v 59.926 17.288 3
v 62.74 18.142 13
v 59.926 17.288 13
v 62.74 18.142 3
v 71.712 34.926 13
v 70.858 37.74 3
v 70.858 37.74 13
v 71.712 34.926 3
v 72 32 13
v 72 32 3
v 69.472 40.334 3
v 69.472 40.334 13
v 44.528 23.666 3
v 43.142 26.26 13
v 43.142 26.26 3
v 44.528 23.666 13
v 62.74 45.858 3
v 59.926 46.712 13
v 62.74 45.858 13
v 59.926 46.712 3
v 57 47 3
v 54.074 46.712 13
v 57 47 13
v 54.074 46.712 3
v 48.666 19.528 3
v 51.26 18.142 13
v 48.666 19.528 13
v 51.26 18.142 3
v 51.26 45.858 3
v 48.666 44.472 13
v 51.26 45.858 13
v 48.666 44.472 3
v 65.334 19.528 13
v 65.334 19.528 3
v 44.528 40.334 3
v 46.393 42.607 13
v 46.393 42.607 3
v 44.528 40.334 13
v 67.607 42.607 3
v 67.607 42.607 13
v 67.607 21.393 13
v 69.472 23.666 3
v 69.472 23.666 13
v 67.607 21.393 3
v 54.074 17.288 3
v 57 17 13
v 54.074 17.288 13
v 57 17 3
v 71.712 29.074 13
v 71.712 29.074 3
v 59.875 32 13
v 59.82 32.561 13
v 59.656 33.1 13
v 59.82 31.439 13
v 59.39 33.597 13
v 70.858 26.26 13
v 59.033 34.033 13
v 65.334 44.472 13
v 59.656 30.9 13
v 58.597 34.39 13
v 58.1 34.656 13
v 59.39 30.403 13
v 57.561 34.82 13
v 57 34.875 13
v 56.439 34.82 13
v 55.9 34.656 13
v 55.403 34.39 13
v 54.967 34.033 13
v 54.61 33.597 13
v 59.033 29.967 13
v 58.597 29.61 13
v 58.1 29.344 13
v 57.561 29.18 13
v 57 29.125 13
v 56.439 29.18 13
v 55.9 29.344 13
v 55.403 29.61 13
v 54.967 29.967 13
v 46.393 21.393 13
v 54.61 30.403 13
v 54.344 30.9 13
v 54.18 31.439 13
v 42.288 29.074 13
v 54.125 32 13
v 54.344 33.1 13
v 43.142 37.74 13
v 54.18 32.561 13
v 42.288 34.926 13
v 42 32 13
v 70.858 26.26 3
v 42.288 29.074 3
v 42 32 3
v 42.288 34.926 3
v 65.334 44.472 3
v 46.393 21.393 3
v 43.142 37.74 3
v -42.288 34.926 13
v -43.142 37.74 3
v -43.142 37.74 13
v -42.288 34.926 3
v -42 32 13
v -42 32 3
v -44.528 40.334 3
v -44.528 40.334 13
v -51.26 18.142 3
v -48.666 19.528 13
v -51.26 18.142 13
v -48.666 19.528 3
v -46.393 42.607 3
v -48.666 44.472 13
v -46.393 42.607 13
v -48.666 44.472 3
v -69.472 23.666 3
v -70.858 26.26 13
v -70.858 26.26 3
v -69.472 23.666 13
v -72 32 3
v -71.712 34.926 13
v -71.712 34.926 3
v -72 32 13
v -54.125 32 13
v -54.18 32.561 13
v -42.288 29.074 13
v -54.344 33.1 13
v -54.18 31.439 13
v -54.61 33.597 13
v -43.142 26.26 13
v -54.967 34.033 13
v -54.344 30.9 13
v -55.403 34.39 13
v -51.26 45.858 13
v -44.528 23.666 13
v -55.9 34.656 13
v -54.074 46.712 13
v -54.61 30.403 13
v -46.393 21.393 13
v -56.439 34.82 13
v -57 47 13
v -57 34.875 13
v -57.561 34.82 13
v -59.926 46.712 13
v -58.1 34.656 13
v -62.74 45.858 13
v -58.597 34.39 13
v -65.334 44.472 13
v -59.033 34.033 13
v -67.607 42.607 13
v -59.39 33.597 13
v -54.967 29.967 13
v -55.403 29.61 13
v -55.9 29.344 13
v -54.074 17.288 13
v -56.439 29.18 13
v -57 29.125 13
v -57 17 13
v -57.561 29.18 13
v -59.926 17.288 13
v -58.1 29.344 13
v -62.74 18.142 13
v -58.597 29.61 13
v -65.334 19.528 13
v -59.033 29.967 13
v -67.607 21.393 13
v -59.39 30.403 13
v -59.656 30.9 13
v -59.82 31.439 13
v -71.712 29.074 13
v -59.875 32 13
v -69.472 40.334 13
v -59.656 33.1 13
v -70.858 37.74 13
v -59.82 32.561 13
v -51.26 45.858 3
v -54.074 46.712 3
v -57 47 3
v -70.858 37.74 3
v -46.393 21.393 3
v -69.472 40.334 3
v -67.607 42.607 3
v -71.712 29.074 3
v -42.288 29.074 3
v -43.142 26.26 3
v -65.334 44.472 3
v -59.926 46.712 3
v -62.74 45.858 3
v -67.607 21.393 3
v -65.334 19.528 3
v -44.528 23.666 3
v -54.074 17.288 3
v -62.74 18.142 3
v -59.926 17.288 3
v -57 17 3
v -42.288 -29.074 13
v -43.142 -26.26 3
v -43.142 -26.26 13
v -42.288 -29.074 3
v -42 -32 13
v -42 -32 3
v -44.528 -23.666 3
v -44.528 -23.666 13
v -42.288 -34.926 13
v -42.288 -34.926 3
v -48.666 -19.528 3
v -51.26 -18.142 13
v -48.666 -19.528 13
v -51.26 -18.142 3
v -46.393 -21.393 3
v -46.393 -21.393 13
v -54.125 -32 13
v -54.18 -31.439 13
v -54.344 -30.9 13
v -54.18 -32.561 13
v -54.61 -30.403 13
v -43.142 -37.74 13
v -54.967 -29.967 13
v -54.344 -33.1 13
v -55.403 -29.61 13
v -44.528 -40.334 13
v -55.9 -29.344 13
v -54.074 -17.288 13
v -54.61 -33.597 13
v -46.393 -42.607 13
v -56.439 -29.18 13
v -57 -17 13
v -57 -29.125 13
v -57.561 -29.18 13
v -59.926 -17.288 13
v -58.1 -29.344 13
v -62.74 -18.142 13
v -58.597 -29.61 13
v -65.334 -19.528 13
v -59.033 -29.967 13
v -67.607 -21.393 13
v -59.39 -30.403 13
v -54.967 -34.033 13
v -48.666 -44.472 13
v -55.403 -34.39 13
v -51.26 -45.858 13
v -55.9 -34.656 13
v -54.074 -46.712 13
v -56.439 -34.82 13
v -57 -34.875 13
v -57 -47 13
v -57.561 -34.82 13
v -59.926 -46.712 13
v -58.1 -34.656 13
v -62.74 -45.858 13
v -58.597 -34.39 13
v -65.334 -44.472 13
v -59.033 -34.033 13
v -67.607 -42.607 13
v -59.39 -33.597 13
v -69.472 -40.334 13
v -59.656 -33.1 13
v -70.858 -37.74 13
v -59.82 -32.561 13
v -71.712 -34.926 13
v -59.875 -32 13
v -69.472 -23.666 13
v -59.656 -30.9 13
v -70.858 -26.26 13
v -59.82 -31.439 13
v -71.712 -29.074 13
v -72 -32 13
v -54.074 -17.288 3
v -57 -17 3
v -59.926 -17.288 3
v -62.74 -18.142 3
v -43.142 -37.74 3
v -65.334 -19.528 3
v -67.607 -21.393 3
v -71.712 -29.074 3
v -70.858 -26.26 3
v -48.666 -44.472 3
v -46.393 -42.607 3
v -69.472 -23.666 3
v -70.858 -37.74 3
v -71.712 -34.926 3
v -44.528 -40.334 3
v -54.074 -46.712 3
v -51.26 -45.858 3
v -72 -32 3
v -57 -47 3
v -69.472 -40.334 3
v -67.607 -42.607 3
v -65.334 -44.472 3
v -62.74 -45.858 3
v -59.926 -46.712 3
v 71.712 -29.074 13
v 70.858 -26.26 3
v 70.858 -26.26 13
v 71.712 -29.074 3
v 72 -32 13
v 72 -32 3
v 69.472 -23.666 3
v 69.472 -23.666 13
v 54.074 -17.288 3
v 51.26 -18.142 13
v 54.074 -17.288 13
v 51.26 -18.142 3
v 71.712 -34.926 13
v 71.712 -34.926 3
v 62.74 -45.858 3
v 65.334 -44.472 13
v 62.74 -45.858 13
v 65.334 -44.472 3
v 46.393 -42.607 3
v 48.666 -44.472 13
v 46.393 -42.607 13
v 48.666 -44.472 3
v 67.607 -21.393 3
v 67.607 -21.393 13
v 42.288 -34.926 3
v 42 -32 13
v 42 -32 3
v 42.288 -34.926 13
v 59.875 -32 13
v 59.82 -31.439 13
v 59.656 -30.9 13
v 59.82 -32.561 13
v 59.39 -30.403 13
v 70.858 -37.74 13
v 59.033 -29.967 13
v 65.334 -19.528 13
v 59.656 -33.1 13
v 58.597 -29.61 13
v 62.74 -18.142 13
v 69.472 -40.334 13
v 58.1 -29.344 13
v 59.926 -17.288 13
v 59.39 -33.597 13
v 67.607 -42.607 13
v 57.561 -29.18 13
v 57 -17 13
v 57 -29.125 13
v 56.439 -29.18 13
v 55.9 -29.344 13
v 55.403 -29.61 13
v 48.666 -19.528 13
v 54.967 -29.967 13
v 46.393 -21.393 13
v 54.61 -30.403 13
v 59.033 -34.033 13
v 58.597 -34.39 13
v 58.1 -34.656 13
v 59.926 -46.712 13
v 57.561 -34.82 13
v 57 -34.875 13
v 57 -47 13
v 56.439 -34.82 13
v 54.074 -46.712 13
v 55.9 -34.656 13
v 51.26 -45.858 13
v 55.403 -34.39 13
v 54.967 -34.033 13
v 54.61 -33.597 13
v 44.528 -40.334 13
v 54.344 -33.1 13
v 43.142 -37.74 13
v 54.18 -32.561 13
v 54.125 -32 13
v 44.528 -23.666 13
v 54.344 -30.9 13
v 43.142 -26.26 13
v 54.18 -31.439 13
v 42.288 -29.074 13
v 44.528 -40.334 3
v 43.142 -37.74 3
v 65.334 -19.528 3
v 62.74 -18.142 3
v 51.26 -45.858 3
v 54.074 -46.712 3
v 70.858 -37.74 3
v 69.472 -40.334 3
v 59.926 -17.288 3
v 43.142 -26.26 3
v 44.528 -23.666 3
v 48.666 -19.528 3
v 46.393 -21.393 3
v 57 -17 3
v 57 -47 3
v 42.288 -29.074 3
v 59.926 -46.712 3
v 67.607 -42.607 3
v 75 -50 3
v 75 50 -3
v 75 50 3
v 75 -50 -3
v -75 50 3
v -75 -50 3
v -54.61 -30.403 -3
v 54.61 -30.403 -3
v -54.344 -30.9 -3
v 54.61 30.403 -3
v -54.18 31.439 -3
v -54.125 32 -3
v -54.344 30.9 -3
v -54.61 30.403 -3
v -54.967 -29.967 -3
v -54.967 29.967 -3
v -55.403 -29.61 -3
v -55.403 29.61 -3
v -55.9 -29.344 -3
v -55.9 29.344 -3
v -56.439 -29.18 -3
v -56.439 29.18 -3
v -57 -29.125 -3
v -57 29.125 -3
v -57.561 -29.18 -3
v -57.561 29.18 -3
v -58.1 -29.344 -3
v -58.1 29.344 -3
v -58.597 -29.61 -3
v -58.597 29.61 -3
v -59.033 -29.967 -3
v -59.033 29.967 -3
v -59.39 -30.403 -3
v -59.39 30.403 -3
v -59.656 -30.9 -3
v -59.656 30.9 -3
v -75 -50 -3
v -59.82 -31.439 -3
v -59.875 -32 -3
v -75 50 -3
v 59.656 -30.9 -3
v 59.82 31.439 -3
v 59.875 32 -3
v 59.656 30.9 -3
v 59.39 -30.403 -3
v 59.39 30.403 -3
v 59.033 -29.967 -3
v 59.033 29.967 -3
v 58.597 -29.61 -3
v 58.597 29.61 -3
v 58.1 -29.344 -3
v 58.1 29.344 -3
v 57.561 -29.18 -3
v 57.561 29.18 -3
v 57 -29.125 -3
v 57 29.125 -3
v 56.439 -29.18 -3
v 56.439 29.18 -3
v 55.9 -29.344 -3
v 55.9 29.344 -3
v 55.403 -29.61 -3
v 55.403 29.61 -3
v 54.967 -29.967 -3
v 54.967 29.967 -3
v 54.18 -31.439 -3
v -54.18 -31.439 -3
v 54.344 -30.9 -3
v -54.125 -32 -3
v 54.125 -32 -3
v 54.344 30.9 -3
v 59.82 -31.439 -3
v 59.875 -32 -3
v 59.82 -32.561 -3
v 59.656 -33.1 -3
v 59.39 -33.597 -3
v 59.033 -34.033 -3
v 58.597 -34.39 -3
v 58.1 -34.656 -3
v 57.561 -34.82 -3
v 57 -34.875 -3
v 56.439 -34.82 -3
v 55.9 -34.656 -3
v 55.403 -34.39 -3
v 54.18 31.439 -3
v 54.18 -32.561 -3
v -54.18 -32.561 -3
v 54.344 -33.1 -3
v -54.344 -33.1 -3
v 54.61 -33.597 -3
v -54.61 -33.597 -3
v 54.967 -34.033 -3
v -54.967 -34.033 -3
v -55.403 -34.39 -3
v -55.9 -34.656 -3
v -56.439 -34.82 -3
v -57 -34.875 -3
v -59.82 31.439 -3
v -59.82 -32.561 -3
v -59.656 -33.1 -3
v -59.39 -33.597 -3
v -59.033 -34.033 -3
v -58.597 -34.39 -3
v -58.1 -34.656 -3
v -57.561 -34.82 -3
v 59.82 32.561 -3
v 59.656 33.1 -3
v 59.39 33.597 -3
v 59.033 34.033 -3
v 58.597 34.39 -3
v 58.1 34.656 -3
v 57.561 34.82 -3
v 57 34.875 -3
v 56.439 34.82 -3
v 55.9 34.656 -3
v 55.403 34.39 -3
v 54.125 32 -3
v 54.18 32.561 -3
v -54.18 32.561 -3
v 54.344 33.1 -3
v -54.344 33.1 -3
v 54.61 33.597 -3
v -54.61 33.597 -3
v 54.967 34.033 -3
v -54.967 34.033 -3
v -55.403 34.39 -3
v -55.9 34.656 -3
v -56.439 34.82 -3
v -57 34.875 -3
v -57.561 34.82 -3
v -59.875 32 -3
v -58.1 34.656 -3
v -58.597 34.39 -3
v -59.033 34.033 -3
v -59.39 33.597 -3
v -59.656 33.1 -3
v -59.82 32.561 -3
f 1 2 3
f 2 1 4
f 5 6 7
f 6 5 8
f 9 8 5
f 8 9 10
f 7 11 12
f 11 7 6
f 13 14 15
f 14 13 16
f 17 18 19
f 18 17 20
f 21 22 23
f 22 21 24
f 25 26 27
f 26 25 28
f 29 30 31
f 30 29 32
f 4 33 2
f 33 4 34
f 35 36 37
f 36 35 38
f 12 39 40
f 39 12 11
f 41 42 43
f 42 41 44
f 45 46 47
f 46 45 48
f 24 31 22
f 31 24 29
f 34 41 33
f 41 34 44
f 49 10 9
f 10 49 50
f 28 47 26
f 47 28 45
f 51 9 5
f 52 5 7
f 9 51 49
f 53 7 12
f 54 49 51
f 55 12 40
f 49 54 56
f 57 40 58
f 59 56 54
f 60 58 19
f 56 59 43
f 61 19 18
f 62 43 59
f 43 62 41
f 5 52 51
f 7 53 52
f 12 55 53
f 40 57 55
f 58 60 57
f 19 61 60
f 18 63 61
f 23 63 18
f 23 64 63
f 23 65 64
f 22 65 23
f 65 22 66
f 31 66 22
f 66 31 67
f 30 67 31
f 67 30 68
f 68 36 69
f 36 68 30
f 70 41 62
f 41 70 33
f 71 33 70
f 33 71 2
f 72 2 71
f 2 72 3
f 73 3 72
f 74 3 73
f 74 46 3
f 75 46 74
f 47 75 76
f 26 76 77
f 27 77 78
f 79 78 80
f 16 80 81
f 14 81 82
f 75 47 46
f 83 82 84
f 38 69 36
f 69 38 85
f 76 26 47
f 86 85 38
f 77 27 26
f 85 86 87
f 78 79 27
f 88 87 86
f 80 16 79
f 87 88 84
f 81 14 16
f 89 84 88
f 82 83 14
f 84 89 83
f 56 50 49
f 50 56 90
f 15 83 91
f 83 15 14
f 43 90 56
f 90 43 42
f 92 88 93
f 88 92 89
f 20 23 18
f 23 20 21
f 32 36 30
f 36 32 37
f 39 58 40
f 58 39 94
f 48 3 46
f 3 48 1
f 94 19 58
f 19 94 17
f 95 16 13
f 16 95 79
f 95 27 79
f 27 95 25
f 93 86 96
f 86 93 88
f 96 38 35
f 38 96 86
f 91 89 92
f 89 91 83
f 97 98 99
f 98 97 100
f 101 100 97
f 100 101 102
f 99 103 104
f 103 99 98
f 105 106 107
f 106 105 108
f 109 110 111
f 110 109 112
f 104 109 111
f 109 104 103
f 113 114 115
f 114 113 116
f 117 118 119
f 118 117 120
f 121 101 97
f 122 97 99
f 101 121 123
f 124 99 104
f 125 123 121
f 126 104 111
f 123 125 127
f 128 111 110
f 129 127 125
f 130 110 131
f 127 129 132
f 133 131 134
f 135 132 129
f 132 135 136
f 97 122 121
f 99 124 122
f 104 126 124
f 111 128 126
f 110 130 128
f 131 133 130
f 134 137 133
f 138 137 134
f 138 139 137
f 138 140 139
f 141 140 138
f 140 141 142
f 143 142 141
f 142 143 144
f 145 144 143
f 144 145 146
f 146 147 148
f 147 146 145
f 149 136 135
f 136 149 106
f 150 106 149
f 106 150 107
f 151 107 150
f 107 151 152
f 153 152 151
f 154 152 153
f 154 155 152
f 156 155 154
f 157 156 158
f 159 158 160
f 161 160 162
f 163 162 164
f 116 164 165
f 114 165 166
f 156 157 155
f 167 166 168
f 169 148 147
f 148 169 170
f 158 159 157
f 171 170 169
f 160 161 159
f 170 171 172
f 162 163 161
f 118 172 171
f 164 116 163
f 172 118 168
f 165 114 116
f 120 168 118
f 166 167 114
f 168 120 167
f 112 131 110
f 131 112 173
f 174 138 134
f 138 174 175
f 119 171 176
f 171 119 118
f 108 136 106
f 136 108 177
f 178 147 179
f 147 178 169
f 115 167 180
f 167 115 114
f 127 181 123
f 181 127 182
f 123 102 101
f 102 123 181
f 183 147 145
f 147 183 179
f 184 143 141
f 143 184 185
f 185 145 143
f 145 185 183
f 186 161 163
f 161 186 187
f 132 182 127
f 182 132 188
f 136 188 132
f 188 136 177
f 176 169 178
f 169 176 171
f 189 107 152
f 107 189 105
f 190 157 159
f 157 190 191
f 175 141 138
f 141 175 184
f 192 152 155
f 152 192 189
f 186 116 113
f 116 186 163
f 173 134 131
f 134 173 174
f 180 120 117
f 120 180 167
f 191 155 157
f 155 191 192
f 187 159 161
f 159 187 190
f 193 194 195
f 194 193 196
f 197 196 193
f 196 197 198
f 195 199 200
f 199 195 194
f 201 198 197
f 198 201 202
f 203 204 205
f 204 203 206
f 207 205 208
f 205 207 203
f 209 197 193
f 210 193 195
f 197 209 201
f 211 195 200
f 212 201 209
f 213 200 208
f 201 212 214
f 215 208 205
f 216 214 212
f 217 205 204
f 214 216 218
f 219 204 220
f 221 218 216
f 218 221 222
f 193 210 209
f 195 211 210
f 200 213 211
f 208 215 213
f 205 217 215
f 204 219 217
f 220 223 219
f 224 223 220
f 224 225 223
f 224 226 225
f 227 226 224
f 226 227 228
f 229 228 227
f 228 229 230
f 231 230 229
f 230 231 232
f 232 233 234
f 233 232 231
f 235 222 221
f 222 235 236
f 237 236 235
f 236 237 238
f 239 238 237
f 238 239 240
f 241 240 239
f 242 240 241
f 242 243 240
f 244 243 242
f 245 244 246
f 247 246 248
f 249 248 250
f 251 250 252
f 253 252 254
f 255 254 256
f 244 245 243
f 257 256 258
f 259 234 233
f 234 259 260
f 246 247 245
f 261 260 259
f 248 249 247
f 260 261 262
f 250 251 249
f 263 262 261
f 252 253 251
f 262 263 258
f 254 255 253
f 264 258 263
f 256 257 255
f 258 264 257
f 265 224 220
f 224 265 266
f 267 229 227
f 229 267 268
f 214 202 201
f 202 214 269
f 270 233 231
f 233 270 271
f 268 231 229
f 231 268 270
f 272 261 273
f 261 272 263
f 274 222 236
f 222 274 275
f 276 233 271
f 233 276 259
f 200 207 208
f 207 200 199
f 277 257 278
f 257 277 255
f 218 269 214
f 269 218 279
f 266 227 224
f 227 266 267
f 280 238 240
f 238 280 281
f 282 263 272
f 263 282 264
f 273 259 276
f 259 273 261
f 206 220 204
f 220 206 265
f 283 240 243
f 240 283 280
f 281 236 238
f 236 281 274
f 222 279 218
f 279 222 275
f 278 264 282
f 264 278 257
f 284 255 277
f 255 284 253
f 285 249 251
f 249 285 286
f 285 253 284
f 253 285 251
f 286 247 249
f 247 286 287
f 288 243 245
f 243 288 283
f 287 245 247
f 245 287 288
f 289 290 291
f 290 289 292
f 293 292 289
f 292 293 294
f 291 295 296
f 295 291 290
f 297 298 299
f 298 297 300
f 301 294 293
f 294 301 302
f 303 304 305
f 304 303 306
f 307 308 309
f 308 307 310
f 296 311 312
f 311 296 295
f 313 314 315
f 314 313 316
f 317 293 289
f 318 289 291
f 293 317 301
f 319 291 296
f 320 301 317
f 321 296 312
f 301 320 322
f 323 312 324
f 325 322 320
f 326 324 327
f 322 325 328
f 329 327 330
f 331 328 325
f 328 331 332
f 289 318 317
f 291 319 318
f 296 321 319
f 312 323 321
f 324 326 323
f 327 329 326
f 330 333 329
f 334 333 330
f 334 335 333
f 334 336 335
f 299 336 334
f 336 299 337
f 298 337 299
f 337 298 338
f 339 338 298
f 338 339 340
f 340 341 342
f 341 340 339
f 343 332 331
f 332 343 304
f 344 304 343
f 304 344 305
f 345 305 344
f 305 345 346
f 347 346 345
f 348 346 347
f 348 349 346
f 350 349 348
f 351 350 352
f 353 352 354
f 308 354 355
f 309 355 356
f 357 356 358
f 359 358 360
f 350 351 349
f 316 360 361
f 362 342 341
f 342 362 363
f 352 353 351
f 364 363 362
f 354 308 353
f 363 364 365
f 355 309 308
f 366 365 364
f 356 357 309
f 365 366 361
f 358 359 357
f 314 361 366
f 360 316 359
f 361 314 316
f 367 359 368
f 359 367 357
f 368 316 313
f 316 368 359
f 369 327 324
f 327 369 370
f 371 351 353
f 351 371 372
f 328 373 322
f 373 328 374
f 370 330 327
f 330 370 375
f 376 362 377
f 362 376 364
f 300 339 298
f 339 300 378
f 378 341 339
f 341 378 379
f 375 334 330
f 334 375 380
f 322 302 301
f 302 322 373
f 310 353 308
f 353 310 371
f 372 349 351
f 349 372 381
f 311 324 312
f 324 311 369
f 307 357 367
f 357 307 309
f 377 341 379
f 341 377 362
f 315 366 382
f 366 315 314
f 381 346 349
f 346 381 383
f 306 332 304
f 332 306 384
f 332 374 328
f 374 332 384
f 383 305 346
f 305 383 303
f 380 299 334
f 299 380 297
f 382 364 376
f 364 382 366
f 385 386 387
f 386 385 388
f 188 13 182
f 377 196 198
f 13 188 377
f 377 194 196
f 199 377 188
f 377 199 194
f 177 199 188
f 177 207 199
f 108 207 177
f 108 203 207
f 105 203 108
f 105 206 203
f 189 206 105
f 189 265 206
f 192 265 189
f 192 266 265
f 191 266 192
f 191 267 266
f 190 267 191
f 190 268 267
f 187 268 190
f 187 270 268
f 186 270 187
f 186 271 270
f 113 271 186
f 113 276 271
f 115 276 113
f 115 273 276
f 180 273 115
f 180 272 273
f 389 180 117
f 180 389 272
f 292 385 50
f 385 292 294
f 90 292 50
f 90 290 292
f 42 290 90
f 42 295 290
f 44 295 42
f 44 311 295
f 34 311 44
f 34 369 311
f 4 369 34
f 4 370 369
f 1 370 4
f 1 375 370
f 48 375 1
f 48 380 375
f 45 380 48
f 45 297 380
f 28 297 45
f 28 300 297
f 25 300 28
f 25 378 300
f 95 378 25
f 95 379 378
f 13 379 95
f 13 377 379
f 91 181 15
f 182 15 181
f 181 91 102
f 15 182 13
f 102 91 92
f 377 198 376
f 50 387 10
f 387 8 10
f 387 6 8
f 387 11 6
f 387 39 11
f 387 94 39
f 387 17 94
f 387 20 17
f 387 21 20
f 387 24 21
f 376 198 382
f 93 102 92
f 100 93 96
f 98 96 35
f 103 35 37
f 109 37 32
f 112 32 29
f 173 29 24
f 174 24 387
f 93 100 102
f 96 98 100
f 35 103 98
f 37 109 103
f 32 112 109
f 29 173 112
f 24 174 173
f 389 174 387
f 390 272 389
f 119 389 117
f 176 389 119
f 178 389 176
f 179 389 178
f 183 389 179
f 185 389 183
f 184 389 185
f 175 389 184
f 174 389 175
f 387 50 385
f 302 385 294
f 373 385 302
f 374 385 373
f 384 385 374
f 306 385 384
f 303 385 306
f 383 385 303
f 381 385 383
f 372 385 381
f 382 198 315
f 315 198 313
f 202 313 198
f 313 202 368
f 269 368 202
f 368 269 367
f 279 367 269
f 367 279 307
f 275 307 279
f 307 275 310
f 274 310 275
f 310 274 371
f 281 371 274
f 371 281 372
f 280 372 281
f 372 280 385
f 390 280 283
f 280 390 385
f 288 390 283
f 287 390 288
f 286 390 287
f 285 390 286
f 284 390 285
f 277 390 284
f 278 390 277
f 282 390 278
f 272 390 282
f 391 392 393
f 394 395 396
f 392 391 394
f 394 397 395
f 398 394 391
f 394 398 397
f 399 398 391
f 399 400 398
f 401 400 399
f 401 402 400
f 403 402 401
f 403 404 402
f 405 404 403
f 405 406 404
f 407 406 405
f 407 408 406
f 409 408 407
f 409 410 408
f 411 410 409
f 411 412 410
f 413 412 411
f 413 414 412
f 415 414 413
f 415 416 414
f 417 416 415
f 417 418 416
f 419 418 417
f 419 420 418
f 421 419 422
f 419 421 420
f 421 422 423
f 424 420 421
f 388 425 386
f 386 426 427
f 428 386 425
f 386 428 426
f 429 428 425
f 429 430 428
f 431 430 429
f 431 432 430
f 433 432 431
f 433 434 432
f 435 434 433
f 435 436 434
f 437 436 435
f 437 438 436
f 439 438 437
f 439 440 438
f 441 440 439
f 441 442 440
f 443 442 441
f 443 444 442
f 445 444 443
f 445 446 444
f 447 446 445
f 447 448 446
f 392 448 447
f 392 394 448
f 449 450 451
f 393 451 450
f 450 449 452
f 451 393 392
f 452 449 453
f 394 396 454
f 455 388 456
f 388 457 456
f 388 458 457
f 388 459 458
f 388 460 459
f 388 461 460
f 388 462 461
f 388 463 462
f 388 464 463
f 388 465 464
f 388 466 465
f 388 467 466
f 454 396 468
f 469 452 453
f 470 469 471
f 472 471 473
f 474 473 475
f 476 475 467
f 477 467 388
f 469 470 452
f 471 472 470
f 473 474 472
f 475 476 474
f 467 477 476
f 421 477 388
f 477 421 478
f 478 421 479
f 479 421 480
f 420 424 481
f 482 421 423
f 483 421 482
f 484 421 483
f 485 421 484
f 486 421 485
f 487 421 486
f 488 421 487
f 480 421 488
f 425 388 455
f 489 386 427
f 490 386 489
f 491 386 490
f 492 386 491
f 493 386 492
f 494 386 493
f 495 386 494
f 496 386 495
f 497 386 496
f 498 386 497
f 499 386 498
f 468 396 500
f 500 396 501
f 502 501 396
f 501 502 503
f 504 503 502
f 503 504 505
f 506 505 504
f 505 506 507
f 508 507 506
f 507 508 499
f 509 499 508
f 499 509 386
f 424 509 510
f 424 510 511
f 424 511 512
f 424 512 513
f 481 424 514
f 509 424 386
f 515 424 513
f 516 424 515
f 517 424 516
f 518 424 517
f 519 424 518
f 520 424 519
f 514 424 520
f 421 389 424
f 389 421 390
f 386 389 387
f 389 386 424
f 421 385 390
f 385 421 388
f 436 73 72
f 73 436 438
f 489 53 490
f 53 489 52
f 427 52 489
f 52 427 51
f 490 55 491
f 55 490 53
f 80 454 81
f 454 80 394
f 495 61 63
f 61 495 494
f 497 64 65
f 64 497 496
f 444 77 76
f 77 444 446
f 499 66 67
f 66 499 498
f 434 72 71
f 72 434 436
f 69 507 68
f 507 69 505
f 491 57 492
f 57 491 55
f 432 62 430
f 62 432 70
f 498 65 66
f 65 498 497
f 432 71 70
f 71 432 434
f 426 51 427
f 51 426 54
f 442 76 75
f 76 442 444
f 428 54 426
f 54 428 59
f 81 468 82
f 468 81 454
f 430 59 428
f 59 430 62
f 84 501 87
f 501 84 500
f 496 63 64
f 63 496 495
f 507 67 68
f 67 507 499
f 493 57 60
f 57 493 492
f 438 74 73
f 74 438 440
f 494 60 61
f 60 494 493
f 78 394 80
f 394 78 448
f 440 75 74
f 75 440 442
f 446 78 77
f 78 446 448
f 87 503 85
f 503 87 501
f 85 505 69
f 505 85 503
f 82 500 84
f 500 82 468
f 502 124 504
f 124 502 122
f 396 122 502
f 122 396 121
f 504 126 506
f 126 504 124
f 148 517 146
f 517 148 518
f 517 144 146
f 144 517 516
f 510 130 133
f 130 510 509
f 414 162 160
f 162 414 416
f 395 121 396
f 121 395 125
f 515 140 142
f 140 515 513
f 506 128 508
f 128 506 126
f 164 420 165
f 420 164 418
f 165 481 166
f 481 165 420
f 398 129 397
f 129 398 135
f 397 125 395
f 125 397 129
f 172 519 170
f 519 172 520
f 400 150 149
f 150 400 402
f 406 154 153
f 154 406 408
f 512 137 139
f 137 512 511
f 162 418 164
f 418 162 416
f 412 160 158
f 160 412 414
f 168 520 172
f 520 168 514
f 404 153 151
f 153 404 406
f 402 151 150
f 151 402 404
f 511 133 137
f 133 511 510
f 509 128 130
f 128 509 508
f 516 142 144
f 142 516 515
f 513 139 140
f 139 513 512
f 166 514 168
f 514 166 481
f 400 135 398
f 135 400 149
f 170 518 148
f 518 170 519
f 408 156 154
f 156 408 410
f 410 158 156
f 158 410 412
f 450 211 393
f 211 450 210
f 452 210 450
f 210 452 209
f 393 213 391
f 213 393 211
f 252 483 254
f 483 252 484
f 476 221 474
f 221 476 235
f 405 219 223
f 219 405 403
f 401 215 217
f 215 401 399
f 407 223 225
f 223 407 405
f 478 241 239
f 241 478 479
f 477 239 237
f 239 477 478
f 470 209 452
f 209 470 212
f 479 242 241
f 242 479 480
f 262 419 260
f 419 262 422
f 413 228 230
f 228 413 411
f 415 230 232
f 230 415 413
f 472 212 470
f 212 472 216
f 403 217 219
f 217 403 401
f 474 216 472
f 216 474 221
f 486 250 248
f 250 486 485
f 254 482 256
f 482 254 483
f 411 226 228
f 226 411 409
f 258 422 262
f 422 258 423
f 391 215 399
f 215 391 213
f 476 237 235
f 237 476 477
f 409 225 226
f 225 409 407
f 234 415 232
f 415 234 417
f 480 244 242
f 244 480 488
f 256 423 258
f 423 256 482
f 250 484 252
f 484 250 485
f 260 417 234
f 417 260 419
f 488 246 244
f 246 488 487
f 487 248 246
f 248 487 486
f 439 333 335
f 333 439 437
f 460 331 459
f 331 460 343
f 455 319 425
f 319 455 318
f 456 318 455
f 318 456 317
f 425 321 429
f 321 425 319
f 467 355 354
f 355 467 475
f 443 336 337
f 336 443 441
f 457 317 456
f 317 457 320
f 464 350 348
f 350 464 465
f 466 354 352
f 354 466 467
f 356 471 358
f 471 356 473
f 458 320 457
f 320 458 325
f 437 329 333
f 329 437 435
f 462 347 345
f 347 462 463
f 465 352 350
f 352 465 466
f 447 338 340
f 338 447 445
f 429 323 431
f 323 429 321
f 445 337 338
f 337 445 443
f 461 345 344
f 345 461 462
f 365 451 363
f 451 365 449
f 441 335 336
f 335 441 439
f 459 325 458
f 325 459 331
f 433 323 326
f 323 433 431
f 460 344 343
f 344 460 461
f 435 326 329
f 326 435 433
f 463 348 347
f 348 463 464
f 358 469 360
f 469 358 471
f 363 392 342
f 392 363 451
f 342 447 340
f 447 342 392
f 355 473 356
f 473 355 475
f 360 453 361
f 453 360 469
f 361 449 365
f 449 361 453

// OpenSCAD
$fn = 32;

// ----------------------------------------------------------------------
// Anchor pads 150 x 100 x 16
// four corner bosses with anchor holes
// ----------------------------------------------------------------------

// --- parameters (mm) ---
plate = [150, 100, 6];   // base plate size (x, y, z)
pads = 4;                // boss count, one per corner
edge = 18;               // boss centre offset from the plate edge
boss_d = 30;             // boss diameter
boss_h = 10;             // boss height above the base plate
bore_d = 5.5;            // nominal hole diameter from the drawing
print_allowance = 0.25;  // clearance added for printing

// --- derived feature positions (mm) ---
hole_d = bore_d + print_allowance;  // = 5.75   hole diameter as printed
height = plate[2] + boss_h;         // = 16   overall height of the part
corner_x = plate[0] / 2 - edge;     // = 57   boss centre X
corner_y = plate[1] / 2 - edge;     // = 32   boss centre Y
feature_centers = [
  [corner_x, corner_y],
  [-corner_x, corner_y],
  [-corner_x, -corner_y],
  [corner_x, -corner_y]
];   // boss centres, anchor holes are drilled there

// base plate, four bosses standing on it, anchor holes all the way through
difference() {
  union() {
    cube(plate, center = true);
    for (centre = feature_centers)
      translate([centre[0], centre[1], plate[2] / 2 - 1])
        cylinder(d = boss_d, h = boss_h + 1);
  }
  for (centre = feature_centers)
    translate([centre[0], centre[1], -height])
      cylinder(d = hole_d, h = 2 * height + 2);  // through boss and plate
}
